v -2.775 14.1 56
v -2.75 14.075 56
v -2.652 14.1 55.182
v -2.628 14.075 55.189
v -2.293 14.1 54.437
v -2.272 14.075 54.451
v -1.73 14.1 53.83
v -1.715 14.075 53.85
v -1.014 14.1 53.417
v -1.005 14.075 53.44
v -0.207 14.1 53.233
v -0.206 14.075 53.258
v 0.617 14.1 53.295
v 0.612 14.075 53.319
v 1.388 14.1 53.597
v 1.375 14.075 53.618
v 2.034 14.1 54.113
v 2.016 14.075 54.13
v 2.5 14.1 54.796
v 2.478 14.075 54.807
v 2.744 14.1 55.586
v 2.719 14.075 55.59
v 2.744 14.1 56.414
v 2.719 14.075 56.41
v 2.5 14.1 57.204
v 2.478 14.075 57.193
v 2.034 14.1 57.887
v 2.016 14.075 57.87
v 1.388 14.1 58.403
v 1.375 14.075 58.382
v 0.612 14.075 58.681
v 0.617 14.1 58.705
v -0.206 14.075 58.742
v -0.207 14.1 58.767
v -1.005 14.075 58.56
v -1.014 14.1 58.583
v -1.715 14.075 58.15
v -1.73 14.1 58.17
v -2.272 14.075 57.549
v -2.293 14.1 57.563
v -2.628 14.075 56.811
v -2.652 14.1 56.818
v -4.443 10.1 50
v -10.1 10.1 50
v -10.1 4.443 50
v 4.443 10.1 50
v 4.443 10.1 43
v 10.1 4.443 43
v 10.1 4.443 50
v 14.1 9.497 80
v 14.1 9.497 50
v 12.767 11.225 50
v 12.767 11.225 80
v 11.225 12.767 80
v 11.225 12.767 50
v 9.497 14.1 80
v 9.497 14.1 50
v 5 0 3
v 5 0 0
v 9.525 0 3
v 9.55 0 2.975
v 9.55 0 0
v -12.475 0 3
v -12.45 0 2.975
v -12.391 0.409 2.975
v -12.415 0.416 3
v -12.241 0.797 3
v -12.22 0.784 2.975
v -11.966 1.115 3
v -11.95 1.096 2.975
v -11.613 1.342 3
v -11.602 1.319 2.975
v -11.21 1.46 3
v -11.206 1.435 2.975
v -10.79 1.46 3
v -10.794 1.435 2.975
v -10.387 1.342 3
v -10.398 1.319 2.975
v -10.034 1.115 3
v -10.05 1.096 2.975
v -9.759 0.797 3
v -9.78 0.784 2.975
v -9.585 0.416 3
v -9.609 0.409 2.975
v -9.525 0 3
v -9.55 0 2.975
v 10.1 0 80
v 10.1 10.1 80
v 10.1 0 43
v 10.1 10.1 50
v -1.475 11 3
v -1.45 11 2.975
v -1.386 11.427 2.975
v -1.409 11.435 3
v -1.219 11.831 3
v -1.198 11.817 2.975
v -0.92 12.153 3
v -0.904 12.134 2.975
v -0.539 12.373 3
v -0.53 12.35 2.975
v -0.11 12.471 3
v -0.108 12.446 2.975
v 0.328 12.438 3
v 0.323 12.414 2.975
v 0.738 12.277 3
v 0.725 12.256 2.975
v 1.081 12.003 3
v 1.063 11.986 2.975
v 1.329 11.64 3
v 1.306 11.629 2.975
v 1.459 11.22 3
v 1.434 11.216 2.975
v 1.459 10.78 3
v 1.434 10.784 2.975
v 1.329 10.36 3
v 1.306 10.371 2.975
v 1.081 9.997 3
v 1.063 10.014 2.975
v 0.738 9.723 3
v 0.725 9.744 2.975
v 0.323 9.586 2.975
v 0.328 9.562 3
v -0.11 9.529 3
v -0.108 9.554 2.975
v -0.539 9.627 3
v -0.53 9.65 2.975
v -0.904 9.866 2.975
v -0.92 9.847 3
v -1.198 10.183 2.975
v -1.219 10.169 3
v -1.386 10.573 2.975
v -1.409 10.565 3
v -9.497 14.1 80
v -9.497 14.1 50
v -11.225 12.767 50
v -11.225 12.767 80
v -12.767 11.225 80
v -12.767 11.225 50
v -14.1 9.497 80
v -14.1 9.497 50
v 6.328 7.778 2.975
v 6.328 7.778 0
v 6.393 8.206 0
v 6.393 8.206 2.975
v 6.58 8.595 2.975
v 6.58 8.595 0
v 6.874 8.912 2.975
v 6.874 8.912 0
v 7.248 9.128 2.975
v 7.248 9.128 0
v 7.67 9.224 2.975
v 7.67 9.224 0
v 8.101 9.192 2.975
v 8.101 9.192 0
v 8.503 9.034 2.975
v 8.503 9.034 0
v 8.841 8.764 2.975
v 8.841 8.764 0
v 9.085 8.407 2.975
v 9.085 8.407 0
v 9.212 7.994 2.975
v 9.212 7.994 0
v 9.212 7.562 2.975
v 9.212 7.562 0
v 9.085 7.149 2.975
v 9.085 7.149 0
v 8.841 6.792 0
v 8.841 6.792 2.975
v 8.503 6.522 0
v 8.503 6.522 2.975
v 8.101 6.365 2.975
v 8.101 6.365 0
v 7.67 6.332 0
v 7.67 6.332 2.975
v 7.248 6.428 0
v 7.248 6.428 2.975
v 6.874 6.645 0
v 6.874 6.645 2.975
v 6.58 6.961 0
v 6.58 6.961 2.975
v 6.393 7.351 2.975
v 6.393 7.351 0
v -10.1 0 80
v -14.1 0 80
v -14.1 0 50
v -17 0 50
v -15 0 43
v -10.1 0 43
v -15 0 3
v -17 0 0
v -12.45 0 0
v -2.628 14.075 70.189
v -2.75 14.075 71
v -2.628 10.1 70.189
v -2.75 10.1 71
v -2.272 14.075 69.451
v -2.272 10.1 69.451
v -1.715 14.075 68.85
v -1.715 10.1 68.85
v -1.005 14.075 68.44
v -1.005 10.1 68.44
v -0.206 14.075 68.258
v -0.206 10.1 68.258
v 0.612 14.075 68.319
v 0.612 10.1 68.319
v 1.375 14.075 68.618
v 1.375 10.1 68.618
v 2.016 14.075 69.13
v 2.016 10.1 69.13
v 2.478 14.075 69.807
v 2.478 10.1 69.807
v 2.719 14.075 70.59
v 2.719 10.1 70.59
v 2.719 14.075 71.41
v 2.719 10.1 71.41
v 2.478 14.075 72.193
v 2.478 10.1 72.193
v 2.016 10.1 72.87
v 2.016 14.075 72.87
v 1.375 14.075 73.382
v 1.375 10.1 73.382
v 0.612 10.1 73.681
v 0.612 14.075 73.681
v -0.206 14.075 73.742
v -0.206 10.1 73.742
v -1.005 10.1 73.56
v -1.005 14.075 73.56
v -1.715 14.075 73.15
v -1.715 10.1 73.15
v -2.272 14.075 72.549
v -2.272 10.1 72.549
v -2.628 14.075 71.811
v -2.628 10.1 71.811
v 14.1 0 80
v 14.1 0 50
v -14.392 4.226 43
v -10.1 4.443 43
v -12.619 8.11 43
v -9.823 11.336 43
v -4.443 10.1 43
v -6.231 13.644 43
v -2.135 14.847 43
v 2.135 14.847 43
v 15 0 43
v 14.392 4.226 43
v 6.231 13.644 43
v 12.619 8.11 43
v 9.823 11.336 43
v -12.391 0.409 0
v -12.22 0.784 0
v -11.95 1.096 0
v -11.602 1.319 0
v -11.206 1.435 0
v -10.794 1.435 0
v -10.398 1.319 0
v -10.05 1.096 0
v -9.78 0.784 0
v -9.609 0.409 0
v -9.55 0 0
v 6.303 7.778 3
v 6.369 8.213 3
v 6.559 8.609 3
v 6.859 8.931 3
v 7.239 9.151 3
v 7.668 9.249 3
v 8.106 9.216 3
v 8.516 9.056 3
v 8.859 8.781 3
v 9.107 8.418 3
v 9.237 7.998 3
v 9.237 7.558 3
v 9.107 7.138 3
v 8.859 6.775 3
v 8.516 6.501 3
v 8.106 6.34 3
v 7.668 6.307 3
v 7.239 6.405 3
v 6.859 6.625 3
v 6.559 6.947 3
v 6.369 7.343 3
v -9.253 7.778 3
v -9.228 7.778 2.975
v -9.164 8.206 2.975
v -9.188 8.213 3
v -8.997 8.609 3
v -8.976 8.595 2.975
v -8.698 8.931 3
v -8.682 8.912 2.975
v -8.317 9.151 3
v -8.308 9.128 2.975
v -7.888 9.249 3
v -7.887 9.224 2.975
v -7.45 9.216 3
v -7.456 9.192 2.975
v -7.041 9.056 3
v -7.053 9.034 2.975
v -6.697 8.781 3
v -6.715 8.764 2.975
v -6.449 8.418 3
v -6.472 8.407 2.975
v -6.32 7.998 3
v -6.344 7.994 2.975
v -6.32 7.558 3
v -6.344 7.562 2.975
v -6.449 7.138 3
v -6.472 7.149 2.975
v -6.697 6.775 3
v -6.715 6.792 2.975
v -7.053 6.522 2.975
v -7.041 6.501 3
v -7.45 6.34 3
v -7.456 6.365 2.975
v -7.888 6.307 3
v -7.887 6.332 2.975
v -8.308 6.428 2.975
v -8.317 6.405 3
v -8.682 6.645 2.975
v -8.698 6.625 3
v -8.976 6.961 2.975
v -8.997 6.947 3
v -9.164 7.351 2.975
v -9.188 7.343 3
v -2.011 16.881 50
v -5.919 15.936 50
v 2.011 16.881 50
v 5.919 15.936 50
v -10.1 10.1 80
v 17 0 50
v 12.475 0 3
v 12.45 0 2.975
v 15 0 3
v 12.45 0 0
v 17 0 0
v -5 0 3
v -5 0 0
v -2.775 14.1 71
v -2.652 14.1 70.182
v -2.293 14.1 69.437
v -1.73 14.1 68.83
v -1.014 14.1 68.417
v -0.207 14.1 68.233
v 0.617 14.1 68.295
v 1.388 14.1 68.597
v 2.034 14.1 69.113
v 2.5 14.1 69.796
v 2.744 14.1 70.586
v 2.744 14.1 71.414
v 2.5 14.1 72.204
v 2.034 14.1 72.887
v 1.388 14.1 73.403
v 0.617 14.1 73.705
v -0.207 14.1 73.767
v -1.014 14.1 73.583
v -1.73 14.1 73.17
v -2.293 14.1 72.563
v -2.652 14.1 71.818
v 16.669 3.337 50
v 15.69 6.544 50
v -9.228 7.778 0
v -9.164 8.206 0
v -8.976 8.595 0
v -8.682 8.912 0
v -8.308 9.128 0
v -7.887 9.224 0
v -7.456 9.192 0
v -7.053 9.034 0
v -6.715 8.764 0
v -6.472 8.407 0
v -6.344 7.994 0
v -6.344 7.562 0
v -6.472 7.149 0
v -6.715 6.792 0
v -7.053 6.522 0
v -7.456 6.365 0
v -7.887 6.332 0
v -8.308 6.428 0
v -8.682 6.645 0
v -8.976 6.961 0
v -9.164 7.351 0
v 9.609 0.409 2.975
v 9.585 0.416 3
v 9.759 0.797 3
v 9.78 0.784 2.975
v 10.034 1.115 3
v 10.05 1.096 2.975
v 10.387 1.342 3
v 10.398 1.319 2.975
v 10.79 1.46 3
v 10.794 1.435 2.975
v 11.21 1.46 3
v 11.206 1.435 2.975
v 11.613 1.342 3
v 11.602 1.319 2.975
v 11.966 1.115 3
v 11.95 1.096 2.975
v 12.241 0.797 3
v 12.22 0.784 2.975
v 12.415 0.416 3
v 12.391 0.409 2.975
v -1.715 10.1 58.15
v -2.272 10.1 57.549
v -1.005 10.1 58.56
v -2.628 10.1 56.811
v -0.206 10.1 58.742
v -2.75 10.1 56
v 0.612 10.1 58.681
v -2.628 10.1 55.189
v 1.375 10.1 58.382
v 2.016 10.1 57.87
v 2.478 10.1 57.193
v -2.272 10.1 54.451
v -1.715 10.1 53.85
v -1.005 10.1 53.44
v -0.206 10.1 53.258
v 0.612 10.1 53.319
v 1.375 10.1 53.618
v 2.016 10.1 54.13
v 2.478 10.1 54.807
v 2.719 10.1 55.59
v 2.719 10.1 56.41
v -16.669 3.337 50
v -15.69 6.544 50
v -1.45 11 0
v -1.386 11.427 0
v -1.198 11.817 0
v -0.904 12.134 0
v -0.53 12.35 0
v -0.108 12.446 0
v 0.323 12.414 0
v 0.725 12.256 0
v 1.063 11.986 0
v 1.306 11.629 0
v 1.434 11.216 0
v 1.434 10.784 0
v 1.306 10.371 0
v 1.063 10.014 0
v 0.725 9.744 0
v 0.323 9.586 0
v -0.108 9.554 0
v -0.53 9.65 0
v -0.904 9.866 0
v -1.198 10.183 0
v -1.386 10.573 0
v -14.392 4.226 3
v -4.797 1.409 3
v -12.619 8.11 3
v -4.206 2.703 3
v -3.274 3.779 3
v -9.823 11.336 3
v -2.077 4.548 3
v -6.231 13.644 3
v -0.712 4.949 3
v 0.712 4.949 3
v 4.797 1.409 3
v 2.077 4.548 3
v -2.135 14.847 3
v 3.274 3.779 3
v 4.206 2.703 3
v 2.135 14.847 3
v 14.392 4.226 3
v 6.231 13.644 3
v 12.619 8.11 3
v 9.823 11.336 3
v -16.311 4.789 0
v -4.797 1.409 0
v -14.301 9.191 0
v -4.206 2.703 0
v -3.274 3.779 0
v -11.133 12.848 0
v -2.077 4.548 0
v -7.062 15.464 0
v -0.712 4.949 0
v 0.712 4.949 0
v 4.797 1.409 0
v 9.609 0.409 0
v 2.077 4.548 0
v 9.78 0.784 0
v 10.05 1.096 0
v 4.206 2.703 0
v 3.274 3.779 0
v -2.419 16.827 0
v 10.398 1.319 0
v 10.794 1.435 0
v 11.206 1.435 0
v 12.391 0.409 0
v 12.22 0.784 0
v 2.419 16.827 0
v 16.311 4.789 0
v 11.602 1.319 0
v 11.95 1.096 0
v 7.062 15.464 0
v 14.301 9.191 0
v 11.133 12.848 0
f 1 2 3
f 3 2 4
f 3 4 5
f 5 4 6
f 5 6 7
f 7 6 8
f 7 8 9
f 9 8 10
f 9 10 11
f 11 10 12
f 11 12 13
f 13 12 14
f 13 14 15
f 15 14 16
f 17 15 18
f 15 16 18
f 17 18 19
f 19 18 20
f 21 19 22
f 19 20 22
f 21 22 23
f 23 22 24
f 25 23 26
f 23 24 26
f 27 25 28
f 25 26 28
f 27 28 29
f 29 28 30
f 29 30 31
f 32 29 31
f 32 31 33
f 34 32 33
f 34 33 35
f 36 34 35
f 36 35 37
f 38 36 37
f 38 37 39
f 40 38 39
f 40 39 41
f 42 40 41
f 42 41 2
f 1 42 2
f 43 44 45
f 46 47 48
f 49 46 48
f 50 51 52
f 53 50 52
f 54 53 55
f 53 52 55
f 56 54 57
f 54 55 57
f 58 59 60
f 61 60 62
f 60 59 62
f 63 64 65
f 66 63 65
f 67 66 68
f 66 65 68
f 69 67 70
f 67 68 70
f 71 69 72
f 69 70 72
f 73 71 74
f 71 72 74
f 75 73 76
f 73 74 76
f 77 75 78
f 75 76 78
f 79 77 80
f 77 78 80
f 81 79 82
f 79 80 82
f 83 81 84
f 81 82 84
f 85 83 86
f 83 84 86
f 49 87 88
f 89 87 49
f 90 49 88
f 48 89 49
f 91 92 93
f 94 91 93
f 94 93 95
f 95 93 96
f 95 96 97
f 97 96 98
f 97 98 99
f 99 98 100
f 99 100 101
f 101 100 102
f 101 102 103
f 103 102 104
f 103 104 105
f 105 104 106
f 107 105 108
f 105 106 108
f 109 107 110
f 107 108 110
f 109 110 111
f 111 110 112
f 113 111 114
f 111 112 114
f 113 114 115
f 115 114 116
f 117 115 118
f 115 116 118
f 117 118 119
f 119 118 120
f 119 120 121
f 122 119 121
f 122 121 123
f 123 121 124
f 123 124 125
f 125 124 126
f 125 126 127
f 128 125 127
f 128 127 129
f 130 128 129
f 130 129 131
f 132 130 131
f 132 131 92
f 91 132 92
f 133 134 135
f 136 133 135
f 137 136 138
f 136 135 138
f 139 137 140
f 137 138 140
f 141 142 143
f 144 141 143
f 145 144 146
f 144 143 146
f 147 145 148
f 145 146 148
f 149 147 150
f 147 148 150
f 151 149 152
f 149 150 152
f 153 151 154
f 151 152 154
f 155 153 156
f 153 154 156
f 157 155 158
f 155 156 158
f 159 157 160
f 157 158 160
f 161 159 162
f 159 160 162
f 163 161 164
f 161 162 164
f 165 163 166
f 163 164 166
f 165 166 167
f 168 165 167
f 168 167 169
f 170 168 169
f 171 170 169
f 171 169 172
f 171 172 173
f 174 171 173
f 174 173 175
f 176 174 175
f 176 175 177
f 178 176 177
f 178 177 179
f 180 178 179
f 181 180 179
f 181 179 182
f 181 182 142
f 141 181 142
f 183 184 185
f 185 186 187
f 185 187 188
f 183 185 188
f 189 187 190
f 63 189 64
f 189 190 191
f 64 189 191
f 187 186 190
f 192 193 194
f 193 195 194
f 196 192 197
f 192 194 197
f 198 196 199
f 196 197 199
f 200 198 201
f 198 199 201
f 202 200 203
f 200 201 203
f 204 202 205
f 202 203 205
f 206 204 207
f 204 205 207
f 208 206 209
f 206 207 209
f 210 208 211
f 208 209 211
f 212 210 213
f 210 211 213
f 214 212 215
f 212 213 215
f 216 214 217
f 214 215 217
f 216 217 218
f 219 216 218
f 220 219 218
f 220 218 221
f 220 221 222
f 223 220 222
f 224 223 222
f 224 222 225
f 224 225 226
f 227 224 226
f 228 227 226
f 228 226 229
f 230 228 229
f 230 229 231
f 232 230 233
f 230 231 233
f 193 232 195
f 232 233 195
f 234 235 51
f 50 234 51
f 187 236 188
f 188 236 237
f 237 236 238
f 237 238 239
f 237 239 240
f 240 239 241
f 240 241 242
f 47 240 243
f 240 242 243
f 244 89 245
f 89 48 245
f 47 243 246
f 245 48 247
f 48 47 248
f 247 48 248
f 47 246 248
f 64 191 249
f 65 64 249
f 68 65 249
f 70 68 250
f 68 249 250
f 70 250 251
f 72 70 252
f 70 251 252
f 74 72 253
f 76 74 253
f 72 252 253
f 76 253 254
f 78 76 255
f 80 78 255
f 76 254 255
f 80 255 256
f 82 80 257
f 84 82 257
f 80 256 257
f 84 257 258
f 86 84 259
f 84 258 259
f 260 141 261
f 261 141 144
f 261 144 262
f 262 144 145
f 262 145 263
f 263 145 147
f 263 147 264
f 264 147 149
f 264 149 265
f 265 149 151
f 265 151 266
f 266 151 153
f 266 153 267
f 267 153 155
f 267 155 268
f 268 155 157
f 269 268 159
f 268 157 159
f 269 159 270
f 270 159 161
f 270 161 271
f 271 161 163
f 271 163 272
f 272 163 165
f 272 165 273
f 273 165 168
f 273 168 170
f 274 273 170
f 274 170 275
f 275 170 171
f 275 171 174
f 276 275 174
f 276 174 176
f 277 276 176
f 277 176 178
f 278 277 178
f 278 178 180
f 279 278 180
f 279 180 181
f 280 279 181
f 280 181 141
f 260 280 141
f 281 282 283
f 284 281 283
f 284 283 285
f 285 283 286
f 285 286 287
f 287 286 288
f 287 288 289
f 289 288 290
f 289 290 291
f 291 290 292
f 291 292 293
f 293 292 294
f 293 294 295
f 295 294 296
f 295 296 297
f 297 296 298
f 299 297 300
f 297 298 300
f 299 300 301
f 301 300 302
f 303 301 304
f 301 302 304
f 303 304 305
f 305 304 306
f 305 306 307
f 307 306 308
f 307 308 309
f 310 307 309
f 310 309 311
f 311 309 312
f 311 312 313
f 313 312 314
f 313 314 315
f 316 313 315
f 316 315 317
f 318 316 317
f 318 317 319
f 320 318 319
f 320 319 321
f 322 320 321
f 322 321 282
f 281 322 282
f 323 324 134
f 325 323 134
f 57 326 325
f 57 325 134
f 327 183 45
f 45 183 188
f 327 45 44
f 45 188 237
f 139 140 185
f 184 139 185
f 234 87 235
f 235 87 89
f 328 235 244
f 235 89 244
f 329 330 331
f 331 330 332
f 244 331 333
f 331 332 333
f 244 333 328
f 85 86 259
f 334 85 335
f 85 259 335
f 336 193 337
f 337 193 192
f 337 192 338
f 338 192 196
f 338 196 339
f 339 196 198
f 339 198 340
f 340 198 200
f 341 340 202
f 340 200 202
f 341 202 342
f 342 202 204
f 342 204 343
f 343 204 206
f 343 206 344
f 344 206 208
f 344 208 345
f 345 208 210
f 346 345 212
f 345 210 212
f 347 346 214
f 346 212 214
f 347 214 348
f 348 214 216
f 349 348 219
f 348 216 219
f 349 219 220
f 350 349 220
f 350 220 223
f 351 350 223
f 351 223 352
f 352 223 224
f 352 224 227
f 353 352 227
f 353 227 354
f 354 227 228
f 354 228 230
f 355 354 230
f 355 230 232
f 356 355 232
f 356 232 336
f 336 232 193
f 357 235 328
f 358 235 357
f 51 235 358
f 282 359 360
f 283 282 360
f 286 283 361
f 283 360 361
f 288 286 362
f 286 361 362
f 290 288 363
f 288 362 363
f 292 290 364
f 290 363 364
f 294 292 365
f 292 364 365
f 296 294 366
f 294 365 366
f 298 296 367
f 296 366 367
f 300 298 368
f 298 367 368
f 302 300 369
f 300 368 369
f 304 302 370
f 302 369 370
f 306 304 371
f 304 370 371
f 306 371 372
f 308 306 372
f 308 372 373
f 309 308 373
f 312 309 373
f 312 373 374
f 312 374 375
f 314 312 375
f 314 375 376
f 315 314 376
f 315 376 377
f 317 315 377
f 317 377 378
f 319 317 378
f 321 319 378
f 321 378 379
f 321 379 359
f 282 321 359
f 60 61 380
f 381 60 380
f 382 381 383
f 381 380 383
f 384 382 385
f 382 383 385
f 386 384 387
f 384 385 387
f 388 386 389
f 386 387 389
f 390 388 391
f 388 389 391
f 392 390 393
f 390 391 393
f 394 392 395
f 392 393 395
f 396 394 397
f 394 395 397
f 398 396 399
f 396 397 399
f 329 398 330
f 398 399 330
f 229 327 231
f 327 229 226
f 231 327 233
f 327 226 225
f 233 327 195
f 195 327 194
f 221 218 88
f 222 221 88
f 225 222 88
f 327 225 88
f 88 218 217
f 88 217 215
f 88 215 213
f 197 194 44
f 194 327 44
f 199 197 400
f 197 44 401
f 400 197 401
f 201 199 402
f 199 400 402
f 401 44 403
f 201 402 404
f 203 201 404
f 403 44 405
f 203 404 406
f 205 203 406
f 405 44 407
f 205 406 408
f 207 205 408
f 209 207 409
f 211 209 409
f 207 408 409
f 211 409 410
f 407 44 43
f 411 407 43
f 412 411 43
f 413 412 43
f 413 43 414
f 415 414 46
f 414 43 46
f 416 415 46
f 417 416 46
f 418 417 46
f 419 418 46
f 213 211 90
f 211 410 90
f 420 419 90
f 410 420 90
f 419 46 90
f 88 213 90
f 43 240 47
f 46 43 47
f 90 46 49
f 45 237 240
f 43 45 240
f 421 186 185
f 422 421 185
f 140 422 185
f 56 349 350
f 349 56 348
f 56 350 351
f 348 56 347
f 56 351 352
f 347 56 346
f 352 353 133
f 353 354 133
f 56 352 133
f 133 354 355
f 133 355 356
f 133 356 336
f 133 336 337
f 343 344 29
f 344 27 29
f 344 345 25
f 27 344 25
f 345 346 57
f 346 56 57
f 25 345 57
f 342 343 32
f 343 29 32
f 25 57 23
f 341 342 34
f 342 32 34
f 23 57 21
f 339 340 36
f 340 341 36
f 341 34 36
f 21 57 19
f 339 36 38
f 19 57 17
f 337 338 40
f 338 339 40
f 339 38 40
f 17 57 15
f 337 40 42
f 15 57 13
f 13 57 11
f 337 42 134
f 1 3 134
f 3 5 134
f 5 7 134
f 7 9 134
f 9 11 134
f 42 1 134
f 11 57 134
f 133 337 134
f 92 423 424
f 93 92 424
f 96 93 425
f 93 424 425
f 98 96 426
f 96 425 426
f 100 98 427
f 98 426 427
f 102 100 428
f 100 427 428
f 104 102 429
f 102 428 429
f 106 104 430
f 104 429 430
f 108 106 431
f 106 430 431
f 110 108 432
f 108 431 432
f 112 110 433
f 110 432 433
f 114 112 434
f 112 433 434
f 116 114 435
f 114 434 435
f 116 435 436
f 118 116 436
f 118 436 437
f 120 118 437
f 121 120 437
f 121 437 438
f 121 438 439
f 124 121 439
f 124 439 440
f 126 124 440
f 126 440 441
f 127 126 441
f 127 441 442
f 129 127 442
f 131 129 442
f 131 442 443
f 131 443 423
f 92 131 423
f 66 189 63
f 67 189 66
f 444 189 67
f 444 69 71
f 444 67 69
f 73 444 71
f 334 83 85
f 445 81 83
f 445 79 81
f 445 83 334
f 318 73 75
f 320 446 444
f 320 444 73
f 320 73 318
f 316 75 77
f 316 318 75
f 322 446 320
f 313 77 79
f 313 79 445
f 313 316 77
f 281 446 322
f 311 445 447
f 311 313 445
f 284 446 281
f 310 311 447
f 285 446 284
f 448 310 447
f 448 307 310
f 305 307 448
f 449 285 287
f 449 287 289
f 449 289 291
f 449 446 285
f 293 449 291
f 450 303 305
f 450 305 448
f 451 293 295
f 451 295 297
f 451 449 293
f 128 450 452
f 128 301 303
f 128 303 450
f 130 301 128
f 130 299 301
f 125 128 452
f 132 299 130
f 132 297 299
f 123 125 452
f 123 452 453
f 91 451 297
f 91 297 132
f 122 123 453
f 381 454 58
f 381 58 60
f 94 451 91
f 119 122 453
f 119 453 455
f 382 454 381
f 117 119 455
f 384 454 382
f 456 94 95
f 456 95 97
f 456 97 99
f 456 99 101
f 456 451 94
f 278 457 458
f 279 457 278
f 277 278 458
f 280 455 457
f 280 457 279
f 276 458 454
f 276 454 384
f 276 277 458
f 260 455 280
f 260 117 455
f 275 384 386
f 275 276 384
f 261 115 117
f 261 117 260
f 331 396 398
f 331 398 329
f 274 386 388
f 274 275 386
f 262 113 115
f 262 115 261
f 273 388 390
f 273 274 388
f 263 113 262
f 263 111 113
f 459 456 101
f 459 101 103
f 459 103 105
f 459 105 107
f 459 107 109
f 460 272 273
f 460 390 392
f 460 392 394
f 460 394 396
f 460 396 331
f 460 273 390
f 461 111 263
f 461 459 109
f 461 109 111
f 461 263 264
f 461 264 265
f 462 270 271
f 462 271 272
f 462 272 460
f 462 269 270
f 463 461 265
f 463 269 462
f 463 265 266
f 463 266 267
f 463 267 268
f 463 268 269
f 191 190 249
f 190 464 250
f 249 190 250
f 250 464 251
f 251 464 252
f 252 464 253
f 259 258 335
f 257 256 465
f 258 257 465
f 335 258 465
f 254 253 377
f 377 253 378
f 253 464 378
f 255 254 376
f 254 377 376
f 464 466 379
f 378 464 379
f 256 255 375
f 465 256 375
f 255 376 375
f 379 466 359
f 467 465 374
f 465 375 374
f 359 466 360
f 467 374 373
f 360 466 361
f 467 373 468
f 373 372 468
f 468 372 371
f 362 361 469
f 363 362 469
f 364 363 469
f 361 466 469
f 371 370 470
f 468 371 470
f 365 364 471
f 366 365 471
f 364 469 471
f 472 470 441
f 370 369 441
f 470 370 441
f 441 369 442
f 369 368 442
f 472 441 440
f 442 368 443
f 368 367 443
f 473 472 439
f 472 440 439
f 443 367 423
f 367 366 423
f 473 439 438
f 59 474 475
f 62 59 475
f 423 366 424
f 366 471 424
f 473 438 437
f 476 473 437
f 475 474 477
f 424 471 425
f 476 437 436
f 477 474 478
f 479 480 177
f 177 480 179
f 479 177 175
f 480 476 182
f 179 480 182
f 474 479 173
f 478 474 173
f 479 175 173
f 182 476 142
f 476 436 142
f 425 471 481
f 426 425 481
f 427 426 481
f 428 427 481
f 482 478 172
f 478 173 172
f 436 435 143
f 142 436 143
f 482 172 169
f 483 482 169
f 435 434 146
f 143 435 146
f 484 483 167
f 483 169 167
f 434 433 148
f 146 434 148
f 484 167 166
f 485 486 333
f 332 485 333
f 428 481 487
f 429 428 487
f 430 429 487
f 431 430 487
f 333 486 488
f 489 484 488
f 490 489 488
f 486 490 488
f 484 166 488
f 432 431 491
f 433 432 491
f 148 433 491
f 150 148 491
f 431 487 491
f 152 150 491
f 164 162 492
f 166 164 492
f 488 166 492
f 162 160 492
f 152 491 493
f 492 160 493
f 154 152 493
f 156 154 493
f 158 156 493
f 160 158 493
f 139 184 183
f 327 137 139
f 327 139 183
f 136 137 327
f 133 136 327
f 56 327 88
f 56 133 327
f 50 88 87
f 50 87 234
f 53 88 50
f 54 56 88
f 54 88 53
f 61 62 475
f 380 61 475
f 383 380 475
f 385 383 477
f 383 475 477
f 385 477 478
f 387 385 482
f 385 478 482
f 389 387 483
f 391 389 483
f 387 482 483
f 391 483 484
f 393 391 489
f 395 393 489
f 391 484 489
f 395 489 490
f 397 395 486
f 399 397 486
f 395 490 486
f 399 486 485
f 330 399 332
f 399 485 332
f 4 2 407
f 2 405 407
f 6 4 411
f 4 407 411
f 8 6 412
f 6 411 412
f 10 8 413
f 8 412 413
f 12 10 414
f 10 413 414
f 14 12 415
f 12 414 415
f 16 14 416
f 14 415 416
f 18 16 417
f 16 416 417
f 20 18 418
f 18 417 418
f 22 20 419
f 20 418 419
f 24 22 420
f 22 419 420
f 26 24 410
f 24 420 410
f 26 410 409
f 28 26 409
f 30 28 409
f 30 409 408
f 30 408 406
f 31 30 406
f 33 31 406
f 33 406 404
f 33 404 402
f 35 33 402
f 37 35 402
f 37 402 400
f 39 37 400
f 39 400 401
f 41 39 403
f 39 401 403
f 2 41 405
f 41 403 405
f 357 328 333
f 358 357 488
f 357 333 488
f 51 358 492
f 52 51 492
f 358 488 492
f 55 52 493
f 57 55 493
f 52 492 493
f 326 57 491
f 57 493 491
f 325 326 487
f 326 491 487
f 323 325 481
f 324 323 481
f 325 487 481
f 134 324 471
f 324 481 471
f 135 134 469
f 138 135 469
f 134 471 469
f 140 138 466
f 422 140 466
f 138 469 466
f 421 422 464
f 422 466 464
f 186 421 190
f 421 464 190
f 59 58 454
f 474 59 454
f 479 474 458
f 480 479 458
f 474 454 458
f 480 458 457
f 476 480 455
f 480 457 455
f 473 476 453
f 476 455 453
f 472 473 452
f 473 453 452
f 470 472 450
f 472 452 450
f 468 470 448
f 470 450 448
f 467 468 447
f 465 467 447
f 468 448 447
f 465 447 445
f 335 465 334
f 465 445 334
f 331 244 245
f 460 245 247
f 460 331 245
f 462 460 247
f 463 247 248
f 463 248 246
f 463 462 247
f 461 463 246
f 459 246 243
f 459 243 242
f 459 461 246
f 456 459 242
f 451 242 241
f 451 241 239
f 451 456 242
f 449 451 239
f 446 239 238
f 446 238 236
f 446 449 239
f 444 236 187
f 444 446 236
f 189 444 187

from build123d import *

# Parameters (mm, degrees)
SKETCH_1_R                     = 17
EXTRUDE_1_DEPTH                = 3
SKETCH_2_R                     = 17
SKETCH_2_R_2                   = 15
EXTRUDE_2_DEPTH                = 40
SKETCH_3_R                     = 5
CUT_EXTRUDE_1_DEPTH            = 4
SKETCH_4_R                     = 17
EXTRUDE_3_DEPTH                = 7
SKETCH_5_W                     = 20.2
SKETCH_5_H                     = 20.2
EXTRUDE_4_DEPTH                = 30
HOLE_WIZARD_M5_2_D             = 5.5
HOLE_WIZARD_M5_2_CSINK_D       = 5.55
HOLE_WIZARD_M5_2_CSINK_ANGLE   = 90
HOLE_WIZARD_M2_5_2_D           = 2.9
HOLE_WIZARD_M2_5_2_DEPTH       = 3
HOLE_WIZARD_M2_5_2_CSINK_D     = 2.95
HOLE_WIZARD_M2_5_2_CSINK_ANGLE = 90
SKETCH_12_W                    = 47.187362465
SKETCH_12_H                    = 89.366632215
CUT_EXTRUDE_2_DEPTH            = 18


with BuildPart() as part:
    # 草图1 → 凸台-拉伸1 (new body)
    with BuildSketch(Plane.XY):
        Circle(SKETCH_1_R)
    extrude(amount=EXTRUDE_1_DEPTH)

    # 草图2 → 凸台-拉伸2 (add)
    with BuildSketch(Plane.XY.offset(3)):
        Circle(SKETCH_2_R)
        Circle(SKETCH_2_R_2, mode=Mode.SUBTRACT)
    extrude(amount=EXTRUDE_2_DEPTH)

    # 草图3 → 切除-拉伸1 (cut, through all)
    with BuildSketch(Plane.XY.offset(3)):
        Circle(SKETCH_3_R)
    extrude(amount=-CUT_EXTRUDE_1_DEPTH, mode=Mode.SUBTRACT)

    # 草图4 → 凸台-拉伸3 (add)
    with BuildSketch(Plane.XY.offset(43)):
        Circle(SKETCH_4_R)
        Polygon((-4.443145751, 10.1), (4.443145751, 10.1), (10.1, 4.443145751), (10.1, -4.443145751), (4.443145751, -10.1), (-4.443145751, -10.1), (-10.1, -4.443145751), (-10.1, 4.443145751), align=None, mode=Mode.SUBTRACT)
    extrude(amount=EXTRUDE_3_DEPTH)

    # 草图5 → 凸台-拉伸4 (add)
    with BuildSketch(Plane.XY.offset(50)):
        with BuildLine():
            Line((9.49684158, 14.1), (-9.49684158, 14.1))
            ThreePointArc((-9.49684158, 14.1), (-12.02081528, 12.02081528), (-14.1, 9.49684158))
            Line((-14.1, 9.49684158), (-14.1, -9.496842588))
            ThreePointArc((-14.1, -9.496842588), (-12.020815678, -12.020815678), (-9.496842588, -14.1))
            Line((-9.496842588, -14.1), (9.49684158, -14.1))
            ThreePointArc((9.49684158, -14.1), (12.02081528, -12.02081528), (14.1, -9.49684158))
            Line((14.1, -9.49684158), (14.1, 9.49684158))
            ThreePointArc((14.1, 9.49684158), (12.02081528, 12.02081528), (9.49684158, 14.1))
        make_face()
        Rectangle(SKETCH_5_W, SKETCH_5_H, mode=Mode.SUBTRACT)
    extrude(amount=EXTRUDE_4_DEPTH)

    # M5 间隙孔2 (through all)
    with Locations(Plane(origin=(0, 14.1, 0), x_dir=(1, 0, 0), z_dir=(0, 1, 0))):
        with Locations((0, -56), (0, -71)):
            CounterSinkHole(HOLE_WIZARD_M5_2_D / 2, HOLE_WIZARD_M5_2_CSINK_D / 2, counter_sink_angle=HOLE_WIZARD_M5_2_CSINK_ANGLE)

    # M2.5 间隙孔2
    with Locations(Plane.XY.offset(3)):
        with Locations((11, 0), (7.778174593, -7.778174593), (0, -11), (-7.778174593, -7.778174593), (-11, 0), (-7.778174593, 7.778174593), (0, 11), (7.778174593, 7.778174593)):
            CounterSinkHole(HOLE_WIZARD_M2_5_2_D / 2, HOLE_WIZARD_M2_5_2_CSINK_D / 2, depth=HOLE_WIZARD_M2_5_2_DEPTH, counter_sink_angle=HOLE_WIZARD_M2_5_2_CSINK_ANGLE)

    # 草图12 → 切除-拉伸2 (cut)
    with BuildSketch(Plane(origin=(0, 0, 0), x_dir=(1, 0, 0), z_dir=(0, 1, 0))):
        with Locations((-0.779036645, -41.61129095)):
            Rectangle(SKETCH_12_W, SKETCH_12_H)
    extrude(amount=-CUT_EXTRUDE_2_DEPTH, mode=Mode.SUBTRACT)


solid = part.part
